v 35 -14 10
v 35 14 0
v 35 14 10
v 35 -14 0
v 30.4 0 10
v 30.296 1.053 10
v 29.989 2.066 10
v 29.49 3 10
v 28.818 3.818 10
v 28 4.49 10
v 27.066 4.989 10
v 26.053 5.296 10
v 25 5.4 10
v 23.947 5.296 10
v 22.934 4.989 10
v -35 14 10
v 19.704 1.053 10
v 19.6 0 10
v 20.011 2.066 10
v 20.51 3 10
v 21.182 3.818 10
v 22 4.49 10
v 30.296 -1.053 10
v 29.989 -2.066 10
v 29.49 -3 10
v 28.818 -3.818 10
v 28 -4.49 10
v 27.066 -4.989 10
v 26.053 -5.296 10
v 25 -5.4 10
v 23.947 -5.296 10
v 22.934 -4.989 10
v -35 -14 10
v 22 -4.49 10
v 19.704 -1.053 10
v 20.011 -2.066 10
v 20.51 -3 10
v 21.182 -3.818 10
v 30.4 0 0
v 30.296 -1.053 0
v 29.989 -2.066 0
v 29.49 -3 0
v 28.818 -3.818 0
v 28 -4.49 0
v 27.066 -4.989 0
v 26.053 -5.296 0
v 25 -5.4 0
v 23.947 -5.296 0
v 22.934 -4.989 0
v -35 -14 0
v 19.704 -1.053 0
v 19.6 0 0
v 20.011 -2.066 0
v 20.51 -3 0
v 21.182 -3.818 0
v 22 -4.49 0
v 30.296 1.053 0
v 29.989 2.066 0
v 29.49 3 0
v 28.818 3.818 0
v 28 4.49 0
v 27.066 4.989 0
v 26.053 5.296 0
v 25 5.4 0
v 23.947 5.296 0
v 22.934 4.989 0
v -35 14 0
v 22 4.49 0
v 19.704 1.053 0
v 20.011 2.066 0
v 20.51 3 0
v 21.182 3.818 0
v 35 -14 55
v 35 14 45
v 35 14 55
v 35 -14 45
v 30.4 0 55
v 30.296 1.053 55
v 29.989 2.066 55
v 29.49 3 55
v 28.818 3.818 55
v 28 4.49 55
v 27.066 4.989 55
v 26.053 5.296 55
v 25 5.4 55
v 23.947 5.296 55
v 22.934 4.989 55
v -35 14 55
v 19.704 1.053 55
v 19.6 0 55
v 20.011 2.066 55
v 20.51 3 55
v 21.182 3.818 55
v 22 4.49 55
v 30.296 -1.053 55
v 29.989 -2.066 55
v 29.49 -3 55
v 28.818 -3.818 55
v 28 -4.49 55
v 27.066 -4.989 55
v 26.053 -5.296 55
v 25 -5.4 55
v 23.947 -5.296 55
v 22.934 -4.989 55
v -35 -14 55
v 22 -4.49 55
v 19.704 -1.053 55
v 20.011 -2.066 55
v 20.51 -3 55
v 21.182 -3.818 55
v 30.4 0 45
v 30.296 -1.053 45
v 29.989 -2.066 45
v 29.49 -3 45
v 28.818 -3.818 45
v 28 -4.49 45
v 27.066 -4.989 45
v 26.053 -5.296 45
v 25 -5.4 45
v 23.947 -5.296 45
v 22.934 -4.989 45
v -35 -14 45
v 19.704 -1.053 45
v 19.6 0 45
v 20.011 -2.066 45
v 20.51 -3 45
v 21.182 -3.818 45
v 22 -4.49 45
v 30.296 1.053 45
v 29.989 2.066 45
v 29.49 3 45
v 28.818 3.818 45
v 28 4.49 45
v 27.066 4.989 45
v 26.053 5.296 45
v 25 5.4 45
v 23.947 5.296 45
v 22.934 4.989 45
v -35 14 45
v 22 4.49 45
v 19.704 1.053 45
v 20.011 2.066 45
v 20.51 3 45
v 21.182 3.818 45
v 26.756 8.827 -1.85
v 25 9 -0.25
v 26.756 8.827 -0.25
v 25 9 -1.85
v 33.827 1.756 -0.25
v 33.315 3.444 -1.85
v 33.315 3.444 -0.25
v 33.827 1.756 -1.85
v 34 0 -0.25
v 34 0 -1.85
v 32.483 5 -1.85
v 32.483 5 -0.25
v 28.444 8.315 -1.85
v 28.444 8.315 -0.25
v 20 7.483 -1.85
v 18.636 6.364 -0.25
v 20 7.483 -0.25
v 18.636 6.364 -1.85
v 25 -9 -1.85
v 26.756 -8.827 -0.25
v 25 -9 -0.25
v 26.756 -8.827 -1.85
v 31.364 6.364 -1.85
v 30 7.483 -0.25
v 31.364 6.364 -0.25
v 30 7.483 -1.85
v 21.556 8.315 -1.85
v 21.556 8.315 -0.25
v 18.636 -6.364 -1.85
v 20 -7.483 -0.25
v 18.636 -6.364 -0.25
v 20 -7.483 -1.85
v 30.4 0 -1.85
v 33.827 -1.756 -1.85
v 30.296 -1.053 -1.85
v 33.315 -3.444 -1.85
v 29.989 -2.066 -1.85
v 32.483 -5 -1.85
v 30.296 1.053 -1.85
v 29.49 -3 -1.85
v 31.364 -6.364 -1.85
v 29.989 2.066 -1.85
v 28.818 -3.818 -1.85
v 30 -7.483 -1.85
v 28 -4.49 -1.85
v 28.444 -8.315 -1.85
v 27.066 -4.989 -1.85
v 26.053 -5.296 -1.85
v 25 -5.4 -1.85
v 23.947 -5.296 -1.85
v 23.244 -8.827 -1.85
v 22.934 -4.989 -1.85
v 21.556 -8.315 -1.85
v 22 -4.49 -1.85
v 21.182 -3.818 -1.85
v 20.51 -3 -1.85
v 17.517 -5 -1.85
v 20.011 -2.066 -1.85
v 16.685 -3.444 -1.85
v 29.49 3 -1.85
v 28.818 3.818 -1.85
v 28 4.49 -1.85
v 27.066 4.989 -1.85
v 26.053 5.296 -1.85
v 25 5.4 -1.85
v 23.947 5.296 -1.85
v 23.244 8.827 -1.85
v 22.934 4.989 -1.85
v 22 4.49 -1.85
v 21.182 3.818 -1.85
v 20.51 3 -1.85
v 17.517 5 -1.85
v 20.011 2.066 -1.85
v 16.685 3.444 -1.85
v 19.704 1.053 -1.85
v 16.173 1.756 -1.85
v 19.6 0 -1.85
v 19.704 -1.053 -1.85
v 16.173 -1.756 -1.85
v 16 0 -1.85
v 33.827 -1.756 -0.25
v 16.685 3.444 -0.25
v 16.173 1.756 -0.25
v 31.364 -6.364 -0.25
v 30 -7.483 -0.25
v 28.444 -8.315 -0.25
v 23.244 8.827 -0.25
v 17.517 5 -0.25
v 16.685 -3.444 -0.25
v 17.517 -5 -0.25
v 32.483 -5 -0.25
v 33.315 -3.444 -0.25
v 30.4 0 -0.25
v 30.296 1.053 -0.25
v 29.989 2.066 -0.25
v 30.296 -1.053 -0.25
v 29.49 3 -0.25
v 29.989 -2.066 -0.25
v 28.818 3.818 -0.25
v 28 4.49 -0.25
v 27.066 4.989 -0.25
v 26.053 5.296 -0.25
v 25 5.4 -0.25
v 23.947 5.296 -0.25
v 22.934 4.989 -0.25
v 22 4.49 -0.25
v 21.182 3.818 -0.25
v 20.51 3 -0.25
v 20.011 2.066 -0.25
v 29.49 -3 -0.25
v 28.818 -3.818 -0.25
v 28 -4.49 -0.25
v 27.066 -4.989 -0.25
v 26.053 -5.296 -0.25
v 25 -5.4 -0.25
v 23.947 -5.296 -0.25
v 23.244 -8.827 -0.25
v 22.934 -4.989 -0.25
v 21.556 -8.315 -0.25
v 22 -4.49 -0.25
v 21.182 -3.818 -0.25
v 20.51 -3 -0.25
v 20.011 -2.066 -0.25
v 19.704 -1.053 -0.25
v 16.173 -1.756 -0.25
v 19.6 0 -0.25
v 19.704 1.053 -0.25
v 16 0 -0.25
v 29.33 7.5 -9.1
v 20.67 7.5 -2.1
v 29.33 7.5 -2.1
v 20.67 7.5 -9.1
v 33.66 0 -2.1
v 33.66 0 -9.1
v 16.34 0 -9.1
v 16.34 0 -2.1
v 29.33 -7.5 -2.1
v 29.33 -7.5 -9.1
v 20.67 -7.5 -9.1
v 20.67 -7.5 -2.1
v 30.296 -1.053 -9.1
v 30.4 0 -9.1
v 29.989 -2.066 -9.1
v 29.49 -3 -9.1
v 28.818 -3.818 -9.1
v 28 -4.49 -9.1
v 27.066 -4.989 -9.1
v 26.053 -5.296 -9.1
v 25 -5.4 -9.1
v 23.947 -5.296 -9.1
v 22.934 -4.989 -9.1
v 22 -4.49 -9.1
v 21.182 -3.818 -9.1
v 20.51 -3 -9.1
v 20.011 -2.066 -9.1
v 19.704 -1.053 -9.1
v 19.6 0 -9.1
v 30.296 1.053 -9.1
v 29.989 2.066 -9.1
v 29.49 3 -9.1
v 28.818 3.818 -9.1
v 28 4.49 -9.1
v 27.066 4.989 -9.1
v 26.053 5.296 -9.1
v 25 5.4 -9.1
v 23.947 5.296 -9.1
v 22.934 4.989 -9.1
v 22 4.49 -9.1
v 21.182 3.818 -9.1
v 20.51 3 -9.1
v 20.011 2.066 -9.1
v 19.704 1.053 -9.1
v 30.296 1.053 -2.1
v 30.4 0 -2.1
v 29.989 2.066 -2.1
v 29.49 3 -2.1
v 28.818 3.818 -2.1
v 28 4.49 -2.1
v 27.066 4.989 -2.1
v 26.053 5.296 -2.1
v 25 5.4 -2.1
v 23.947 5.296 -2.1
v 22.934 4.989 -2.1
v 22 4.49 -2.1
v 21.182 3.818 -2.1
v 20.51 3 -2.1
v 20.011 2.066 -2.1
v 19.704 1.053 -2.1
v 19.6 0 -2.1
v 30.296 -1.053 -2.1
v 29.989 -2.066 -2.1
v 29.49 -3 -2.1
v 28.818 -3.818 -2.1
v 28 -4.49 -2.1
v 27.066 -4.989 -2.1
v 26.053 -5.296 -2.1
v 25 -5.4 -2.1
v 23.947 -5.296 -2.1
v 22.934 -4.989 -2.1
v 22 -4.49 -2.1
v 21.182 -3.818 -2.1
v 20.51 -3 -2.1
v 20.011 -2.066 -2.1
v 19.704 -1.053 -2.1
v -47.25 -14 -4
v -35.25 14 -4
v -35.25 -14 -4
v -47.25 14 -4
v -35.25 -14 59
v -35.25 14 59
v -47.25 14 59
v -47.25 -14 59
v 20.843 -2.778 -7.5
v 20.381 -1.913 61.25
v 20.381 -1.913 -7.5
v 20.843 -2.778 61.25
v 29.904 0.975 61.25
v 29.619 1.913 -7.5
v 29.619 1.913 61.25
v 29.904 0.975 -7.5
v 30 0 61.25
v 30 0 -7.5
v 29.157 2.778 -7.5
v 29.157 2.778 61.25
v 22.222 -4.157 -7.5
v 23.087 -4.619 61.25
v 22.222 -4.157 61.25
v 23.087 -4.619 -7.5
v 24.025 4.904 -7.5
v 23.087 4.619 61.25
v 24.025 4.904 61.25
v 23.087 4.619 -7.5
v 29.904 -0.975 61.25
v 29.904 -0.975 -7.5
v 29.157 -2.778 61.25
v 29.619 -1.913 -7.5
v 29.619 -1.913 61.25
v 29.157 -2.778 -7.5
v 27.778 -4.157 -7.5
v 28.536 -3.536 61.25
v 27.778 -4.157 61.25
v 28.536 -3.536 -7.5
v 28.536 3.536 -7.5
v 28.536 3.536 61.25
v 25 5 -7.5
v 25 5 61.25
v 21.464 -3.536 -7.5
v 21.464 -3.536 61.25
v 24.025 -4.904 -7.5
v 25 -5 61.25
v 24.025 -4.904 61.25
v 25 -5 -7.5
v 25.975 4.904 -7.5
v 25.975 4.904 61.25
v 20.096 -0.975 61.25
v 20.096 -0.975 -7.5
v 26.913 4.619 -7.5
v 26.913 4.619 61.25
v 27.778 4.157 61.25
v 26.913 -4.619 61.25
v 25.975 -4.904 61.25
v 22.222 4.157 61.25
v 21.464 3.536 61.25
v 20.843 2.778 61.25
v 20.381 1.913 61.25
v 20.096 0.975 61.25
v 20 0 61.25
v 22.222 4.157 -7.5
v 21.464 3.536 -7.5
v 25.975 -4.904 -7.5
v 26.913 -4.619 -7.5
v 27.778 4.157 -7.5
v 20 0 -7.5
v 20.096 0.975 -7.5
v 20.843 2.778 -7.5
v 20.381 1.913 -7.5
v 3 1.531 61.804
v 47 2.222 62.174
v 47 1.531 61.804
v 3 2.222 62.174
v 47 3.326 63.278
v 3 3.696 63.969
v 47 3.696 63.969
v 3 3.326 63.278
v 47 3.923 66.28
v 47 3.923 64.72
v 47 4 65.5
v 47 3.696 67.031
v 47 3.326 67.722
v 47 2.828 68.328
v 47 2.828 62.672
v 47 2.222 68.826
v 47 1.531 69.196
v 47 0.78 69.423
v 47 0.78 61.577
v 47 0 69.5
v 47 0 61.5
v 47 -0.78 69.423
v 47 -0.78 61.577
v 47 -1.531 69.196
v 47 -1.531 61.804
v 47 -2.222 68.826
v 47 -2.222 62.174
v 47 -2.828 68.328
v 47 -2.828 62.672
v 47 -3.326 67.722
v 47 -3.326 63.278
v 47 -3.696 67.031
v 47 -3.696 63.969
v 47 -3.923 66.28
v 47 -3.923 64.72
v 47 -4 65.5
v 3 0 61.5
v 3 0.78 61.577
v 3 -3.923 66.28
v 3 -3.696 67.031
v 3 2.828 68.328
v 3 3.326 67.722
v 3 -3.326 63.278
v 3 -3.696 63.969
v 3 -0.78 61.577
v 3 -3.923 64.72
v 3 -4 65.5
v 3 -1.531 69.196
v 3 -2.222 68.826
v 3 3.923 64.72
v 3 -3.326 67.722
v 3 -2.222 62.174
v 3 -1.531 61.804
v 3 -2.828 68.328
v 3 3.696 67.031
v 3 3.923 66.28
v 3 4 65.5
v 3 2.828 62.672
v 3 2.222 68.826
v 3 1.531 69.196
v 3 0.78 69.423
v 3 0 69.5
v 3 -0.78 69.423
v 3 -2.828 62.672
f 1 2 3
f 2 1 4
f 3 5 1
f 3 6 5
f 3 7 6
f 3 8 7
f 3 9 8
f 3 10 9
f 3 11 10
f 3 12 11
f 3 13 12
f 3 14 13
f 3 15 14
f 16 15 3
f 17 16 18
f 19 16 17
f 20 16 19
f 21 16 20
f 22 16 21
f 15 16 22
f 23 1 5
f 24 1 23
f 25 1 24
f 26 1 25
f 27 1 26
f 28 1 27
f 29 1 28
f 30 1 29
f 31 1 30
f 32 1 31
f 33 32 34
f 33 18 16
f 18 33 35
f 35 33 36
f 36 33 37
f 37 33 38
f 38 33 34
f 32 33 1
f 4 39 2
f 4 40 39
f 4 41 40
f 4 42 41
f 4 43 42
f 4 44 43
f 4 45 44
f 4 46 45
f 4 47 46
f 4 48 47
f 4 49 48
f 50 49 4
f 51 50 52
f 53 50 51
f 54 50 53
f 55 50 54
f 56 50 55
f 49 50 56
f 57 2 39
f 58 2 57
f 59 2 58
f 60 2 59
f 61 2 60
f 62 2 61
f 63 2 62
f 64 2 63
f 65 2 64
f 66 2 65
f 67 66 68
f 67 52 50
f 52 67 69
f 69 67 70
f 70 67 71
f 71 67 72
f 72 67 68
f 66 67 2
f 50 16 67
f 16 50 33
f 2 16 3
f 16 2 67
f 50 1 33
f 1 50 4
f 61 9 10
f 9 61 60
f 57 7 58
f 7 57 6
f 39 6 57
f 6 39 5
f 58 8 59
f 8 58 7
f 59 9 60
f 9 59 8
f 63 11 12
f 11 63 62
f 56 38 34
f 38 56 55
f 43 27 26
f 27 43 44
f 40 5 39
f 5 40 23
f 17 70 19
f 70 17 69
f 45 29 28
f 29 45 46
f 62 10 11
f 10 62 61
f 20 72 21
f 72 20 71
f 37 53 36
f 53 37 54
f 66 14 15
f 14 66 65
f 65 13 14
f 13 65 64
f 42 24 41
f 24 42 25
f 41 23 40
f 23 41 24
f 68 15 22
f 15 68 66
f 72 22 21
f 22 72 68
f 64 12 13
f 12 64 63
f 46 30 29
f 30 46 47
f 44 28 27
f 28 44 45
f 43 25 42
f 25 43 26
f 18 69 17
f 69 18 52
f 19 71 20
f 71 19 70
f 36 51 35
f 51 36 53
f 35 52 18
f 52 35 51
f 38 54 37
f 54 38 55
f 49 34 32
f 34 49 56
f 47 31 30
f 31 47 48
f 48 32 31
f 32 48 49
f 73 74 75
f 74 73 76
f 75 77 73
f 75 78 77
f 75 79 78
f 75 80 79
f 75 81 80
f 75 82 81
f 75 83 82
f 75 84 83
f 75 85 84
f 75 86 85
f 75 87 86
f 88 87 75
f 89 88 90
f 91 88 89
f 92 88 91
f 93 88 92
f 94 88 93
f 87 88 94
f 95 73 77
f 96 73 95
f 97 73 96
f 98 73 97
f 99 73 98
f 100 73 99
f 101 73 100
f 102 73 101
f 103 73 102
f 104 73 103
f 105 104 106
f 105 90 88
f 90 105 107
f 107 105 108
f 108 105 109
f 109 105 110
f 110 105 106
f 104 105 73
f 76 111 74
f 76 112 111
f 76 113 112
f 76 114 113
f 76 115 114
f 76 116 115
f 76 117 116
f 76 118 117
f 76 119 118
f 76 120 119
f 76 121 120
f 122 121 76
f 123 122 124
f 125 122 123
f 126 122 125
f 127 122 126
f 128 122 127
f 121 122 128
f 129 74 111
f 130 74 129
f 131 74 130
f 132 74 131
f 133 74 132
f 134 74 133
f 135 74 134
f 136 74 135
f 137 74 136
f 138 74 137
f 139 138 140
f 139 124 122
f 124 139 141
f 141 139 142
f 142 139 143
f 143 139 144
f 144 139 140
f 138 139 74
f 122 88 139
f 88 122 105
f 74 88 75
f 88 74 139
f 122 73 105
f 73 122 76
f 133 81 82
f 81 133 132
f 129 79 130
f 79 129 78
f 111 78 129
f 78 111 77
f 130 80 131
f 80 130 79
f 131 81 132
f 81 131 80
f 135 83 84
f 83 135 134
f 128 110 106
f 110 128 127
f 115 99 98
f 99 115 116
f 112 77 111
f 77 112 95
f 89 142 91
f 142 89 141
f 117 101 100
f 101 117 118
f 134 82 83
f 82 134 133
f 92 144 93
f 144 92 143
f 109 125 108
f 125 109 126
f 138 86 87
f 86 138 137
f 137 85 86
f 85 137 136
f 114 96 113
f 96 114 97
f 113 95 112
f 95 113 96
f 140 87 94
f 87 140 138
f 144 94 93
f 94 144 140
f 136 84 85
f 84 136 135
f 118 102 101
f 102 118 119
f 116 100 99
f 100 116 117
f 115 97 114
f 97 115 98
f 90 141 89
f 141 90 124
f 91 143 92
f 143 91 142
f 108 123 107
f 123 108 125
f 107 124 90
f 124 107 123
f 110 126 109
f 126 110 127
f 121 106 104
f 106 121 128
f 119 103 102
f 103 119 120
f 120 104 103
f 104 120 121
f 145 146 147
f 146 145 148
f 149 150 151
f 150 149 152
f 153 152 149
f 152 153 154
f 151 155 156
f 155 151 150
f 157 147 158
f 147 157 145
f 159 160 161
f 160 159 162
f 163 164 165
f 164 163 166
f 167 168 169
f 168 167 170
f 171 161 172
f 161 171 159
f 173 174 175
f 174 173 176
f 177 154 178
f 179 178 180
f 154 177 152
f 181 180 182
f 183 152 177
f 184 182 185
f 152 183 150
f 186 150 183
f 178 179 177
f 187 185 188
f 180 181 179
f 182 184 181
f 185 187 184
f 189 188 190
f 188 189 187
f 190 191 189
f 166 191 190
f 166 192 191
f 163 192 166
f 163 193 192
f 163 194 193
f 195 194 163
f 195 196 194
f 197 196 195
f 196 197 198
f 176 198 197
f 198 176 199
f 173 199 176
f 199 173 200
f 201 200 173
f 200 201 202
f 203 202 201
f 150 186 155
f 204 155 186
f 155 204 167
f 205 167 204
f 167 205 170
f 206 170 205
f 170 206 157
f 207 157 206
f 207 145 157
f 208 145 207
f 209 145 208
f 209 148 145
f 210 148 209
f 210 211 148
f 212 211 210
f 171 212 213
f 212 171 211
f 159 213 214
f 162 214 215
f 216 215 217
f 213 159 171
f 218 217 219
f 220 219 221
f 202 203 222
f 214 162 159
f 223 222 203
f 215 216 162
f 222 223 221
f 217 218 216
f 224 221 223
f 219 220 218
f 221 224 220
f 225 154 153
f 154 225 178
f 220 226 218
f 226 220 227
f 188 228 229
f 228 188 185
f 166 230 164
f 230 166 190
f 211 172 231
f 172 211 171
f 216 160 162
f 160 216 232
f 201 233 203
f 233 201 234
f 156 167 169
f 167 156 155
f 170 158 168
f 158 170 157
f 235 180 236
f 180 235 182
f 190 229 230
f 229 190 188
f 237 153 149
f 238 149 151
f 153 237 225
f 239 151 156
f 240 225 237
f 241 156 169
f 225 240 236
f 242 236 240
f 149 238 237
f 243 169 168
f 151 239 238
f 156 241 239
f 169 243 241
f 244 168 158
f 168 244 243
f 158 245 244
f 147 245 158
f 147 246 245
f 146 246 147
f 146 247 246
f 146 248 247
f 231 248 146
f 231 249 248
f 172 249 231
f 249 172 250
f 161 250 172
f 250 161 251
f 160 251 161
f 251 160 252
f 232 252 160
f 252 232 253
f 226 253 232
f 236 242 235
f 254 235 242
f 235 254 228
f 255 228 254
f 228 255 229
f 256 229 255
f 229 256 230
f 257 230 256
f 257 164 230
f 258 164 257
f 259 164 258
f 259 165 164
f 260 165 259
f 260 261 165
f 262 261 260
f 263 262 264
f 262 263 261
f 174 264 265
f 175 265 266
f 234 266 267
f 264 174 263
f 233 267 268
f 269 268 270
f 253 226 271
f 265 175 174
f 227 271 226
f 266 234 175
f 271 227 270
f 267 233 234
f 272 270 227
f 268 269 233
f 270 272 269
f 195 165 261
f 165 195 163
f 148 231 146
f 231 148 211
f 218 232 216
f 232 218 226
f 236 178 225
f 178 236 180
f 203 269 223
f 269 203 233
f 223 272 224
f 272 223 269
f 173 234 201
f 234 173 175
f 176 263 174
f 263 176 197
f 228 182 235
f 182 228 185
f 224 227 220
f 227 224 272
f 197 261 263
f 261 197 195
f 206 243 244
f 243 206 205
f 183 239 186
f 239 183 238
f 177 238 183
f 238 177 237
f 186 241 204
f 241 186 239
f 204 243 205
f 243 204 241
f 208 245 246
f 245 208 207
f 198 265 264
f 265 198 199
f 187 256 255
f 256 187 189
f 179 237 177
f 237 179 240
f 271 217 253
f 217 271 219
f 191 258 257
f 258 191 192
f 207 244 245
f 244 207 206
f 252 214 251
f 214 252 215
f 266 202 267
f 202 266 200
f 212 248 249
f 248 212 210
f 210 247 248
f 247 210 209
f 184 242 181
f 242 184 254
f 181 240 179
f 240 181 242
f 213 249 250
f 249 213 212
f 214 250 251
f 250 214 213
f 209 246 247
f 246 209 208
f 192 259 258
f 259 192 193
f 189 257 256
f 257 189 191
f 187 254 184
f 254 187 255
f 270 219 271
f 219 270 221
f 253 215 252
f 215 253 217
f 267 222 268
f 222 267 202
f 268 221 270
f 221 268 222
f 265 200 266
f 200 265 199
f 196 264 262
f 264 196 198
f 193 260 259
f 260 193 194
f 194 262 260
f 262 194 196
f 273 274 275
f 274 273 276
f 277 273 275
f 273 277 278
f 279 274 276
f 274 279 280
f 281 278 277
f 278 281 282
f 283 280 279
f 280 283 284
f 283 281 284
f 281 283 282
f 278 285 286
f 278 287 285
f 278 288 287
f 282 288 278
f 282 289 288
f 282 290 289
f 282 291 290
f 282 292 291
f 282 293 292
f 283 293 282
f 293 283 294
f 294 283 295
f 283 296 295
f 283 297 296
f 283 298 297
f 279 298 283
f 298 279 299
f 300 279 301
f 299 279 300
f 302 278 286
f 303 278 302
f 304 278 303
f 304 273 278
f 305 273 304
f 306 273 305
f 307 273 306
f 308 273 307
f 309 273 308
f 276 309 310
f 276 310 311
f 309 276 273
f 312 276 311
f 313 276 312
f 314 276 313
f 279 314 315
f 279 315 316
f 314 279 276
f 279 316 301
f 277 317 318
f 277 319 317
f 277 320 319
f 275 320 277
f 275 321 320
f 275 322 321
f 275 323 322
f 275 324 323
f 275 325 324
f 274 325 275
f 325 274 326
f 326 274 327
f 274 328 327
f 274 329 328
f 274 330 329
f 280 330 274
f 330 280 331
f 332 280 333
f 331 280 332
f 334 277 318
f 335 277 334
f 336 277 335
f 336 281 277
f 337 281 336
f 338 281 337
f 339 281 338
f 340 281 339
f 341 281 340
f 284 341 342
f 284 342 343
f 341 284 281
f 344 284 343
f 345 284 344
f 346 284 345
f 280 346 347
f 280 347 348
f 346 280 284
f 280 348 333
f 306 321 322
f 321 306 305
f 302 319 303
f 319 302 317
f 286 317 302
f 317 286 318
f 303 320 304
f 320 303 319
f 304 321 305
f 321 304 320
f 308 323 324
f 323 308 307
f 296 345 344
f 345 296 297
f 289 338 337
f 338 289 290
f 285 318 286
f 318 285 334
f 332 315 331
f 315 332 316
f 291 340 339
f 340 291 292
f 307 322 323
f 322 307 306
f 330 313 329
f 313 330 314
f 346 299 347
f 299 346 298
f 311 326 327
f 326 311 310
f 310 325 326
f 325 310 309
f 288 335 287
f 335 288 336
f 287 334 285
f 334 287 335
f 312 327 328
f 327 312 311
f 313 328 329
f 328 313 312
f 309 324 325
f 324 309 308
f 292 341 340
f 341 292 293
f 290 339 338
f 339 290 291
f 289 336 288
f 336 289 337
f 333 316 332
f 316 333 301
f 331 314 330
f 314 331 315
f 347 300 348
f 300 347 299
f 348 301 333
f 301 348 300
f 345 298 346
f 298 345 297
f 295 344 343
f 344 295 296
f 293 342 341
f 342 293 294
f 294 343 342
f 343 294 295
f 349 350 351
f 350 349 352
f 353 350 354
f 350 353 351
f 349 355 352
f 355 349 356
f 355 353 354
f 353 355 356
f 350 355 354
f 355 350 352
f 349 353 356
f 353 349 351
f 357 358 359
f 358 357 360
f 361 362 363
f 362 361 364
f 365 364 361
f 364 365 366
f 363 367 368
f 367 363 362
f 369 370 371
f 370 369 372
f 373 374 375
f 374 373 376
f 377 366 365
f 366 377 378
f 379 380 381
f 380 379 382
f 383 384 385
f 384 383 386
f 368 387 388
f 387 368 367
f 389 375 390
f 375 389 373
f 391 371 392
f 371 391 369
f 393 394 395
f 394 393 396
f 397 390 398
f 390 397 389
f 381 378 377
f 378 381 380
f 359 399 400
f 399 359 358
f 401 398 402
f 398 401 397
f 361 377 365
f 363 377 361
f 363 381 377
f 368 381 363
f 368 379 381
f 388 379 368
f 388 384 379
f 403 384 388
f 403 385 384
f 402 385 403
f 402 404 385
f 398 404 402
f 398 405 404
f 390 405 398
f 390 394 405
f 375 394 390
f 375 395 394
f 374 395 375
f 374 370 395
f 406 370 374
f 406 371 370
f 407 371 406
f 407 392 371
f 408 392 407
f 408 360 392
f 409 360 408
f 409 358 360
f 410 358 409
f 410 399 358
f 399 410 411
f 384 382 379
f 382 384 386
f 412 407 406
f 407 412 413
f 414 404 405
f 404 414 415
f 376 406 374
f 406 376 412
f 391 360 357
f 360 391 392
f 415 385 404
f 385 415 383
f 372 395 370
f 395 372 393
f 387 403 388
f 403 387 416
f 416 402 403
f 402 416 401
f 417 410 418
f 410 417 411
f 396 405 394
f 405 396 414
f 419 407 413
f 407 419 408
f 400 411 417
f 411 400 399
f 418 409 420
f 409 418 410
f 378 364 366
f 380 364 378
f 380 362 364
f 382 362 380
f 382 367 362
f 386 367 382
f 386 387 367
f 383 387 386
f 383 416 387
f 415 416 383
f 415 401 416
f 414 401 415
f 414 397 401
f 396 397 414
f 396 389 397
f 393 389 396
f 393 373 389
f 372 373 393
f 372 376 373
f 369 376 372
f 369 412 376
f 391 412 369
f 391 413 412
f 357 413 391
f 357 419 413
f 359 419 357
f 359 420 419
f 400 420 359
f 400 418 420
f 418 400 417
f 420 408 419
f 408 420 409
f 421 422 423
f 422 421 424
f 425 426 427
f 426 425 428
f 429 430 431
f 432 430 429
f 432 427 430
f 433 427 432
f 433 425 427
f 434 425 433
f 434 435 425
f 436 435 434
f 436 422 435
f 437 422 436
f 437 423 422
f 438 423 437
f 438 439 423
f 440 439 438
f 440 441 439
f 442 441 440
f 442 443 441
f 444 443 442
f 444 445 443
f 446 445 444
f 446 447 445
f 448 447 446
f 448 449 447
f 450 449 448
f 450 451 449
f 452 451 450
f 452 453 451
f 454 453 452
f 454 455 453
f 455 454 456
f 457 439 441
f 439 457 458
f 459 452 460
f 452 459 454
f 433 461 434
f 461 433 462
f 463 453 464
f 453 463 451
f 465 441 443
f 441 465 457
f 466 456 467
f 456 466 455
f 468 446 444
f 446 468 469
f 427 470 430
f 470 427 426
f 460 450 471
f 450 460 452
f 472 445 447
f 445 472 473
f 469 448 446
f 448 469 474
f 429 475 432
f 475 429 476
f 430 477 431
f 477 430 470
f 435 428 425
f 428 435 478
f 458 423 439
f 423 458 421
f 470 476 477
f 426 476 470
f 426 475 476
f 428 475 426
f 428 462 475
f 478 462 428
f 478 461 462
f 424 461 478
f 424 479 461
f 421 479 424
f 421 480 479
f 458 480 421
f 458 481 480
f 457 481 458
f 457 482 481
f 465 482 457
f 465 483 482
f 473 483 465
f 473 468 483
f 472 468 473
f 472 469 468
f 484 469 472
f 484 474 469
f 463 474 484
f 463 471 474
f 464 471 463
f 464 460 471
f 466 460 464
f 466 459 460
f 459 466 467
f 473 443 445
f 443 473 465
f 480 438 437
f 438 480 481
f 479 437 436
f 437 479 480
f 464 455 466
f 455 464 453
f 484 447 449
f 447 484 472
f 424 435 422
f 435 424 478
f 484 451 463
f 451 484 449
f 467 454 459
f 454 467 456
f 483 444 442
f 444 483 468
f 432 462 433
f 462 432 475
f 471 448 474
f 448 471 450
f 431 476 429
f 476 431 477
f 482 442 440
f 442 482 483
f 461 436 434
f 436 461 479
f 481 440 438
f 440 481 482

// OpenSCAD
$fn = 32;

// ------------------------------------------------------------------------
// C clamp: throat 45 mm, screw d10
// Every part is its own module, assembly() places every instance.
// ------------------------------------------------------------------------

// --- part 1 ---
module clamp_arm() {
  difference() {
    translate([-35, -14, 0]) cube([70, 28, 10]);
    translate([25, 0, -1]) cylinder(h = 12, d = 10.8);
  }
}

// --- part 2 ---
module clamp_spine() {
  difference() {
    translate([-31.5, -14, 0]) cube([63, 28, 12]);
  }
}

// --- part 3 ---
module clamp_screw() {
  translate([0, 0, -34.375]) cylinder(h = 68.75, d = 10);
}

// --- part 4 ---
module clamp_washer() {
  difference() {
      translate([0, 0, 0]) cylinder(h = 1.6, d = 18);
      translate([0, 0, -1]) cylinder(h = 3.6, d = 10.8);
    }
}

// --- part 5 ---
module clamp_nut() {
  difference() {
    linear_extrude(height = 7) polygon(points = [[8.66, 0], [4.33, 7.5], [-4.33, 7.5], [-8.66, 0], [-4.33, -7.5], [4.33, -7.5]]);
    translate([0, 0, -1]) cylinder(h = 9, d = 10.8);
  }
}

// --- part 6 ---
module tommy_bar() {
  translate([0, 0, -22]) cylinder(h = 44, d = 8);
}

// --- assembly ---
module assembly() {
  color([0.80, 0.24, 0.20]) translate([0, 0, 0]) rotate([0, 0, 0]) clamp_arm();
  color([0.20, 0.45, 0.75]) translate([0, 0, 45]) rotate([0, 0, 0]) clamp_arm();
  color([0.25, 0.62, 0.32]) translate([-47.25, 0, 27.5]) rotate([0, 90, 0]) clamp_spine();
  color([0.92, 0.70, 0.18]) translate([25, 0, 26.875]) rotate([0, 0, 0]) clamp_screw();
  color([0.58, 0.35, 0.70]) translate([25, 0, -1.85]) rotate([0, 0, 0]) clamp_washer();
  color([0.16, 0.66, 0.66]) translate([25, 0, -9.1]) rotate([0, 0, 0]) clamp_nut();
  color([0.85, 0.48, 0.18]) translate([25, 0, 65.5]) rotate([0, 90, 0]) tommy_bar();
}

assembly();
